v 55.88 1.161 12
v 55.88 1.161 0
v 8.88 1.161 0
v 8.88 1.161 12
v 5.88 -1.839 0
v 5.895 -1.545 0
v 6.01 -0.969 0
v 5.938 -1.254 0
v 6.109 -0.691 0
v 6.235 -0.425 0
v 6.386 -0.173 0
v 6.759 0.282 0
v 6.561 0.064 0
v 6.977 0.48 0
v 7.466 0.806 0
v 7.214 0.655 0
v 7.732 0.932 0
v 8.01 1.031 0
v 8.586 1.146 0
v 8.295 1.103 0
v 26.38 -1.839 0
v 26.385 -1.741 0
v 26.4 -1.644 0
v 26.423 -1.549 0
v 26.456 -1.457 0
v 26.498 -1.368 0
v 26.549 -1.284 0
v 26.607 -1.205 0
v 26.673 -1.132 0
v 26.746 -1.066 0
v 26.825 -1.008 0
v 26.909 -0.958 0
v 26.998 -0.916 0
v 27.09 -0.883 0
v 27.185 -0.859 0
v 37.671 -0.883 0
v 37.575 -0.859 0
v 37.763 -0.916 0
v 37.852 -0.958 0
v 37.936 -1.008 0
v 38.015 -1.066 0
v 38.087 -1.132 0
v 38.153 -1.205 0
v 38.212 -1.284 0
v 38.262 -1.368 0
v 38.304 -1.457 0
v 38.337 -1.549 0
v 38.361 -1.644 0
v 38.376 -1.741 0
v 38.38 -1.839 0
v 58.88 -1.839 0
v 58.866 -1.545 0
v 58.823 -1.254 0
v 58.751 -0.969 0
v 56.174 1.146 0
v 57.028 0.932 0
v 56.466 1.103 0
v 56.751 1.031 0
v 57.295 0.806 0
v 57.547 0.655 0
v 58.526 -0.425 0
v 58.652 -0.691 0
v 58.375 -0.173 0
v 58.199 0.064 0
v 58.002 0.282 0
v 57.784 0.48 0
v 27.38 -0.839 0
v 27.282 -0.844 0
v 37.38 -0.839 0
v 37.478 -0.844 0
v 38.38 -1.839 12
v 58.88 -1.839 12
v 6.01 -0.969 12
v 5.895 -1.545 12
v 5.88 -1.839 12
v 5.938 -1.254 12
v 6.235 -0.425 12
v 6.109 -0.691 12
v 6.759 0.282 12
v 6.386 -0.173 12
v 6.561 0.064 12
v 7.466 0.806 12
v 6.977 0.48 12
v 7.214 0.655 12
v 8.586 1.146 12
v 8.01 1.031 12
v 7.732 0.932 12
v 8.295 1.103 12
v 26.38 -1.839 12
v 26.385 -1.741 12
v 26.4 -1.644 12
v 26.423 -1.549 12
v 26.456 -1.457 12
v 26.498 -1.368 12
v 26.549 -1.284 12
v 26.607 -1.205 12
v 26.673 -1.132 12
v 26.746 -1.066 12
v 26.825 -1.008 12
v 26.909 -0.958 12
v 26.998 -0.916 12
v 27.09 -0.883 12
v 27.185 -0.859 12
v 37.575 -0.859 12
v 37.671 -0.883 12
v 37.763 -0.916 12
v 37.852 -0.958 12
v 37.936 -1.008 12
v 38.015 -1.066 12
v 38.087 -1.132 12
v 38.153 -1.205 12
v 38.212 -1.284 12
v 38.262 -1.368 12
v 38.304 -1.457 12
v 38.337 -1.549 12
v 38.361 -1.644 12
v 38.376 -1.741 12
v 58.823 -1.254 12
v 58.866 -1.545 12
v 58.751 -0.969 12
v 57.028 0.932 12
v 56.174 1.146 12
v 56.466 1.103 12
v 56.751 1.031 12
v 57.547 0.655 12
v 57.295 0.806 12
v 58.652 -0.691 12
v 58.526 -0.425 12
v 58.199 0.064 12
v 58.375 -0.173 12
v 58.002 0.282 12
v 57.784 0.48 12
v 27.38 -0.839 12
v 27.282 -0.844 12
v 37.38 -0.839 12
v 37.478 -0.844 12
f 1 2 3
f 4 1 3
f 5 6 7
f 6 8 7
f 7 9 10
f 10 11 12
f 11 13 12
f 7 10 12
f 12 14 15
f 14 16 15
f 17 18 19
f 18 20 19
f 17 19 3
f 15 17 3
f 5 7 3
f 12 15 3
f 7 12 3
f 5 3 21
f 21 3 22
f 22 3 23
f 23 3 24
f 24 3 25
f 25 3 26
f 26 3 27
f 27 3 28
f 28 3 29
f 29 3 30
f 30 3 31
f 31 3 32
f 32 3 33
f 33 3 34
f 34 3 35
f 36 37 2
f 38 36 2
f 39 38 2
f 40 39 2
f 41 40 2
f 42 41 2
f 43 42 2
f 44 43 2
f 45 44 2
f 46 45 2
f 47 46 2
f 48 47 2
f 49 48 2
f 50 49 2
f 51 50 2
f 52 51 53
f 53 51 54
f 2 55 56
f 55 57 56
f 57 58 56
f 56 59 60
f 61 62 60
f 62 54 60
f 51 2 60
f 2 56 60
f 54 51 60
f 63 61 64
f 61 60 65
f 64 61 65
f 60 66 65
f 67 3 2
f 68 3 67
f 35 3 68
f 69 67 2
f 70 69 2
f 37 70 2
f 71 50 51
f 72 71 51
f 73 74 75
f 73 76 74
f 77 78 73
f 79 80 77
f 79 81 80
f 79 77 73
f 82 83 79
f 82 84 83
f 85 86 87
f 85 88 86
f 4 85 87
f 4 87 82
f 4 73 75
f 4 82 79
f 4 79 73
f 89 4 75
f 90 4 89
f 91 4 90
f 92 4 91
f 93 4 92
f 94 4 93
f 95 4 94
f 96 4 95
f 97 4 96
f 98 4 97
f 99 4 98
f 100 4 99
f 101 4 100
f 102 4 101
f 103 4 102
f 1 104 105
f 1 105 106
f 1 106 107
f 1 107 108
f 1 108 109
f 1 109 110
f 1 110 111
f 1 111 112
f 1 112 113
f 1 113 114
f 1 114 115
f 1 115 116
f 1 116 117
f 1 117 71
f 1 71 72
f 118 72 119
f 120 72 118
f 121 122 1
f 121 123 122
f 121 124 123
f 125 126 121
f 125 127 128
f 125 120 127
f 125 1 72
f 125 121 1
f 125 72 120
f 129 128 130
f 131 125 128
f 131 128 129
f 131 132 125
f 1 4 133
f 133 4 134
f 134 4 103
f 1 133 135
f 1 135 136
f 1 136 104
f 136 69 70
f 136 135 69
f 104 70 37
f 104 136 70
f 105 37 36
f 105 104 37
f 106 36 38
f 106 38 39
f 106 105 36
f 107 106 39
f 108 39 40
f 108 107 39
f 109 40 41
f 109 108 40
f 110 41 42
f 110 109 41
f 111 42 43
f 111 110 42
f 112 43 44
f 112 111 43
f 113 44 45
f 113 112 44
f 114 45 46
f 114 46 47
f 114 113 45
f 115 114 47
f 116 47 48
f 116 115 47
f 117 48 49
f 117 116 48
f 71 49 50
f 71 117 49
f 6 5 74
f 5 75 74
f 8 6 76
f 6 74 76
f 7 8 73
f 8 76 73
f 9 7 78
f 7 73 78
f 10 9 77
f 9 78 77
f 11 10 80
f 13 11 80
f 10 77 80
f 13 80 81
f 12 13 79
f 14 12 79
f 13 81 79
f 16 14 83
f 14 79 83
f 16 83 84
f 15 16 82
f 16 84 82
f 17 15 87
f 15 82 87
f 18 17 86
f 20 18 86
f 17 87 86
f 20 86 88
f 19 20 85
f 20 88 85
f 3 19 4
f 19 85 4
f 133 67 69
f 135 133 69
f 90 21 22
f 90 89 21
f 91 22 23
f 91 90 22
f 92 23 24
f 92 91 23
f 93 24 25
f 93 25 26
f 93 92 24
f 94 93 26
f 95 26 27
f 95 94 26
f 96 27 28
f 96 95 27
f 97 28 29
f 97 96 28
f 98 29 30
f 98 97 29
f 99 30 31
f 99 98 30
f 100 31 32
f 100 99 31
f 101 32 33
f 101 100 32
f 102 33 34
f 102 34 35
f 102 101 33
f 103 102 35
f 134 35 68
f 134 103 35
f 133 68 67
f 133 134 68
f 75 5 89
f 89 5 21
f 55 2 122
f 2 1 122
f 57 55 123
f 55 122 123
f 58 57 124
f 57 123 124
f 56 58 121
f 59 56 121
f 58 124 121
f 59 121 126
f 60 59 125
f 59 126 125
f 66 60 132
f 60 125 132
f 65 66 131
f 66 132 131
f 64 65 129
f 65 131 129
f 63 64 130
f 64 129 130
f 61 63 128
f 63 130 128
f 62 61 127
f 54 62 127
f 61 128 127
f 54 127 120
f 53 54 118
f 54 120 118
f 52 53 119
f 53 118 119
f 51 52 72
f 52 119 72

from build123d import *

# Parameters (mm, degrees)
F1_DEPTH = 12
F2_R     = 0.99999
F3_R     = 2.99999


# Not quite as in the source:
# - a fillet or chamfer is up to 0.001 mm smaller than in the source, because OpenCascade refuses the exact size


with BuildPart() as f1:
    # F0 (on Top) → F1 (new body)
    with BuildSketch(Plane.XY):
        Polygon((23.3803613689, 1.1605409955), (5.8803613689, 1.1605409955), (5.8803613689, -1.8394590045), (26.3803613689, -1.8394590045), (26.3803613689, -0.8394590045), (38.3803613689, -0.8394590045), (38.3803613689, -1.8394590045), (58.8803613689, -1.8394590045), (58.8803613689, 1.1605409955), (41.3803613689, 1.1605409955), align=None)
    extrude(amount=F1_DEPTH)

    # F2 (radius 1 in the source; OpenCascade refuses exactly that, so slightly less here)
    f2_edges = [f1.edges().sort_by_distance(p)[0] for p in [
        (38.380361, -0.839459, 6),
        (26.380361, -0.839459, 6),
    ]]
    fillet(f2_edges, radius=F2_R)

    # F3 (radius 3 in the source; OpenCascade refuses exactly that, so slightly less here)
    f3_edges = [f1.edges().sort_by_distance(p)[0] for p in [
        (5.880361, 1.160541, 6),
        (58.880361, 1.160541, 6),
    ]]
    fillet(f3_edges, radius=F3_R)


solid = f1.part
